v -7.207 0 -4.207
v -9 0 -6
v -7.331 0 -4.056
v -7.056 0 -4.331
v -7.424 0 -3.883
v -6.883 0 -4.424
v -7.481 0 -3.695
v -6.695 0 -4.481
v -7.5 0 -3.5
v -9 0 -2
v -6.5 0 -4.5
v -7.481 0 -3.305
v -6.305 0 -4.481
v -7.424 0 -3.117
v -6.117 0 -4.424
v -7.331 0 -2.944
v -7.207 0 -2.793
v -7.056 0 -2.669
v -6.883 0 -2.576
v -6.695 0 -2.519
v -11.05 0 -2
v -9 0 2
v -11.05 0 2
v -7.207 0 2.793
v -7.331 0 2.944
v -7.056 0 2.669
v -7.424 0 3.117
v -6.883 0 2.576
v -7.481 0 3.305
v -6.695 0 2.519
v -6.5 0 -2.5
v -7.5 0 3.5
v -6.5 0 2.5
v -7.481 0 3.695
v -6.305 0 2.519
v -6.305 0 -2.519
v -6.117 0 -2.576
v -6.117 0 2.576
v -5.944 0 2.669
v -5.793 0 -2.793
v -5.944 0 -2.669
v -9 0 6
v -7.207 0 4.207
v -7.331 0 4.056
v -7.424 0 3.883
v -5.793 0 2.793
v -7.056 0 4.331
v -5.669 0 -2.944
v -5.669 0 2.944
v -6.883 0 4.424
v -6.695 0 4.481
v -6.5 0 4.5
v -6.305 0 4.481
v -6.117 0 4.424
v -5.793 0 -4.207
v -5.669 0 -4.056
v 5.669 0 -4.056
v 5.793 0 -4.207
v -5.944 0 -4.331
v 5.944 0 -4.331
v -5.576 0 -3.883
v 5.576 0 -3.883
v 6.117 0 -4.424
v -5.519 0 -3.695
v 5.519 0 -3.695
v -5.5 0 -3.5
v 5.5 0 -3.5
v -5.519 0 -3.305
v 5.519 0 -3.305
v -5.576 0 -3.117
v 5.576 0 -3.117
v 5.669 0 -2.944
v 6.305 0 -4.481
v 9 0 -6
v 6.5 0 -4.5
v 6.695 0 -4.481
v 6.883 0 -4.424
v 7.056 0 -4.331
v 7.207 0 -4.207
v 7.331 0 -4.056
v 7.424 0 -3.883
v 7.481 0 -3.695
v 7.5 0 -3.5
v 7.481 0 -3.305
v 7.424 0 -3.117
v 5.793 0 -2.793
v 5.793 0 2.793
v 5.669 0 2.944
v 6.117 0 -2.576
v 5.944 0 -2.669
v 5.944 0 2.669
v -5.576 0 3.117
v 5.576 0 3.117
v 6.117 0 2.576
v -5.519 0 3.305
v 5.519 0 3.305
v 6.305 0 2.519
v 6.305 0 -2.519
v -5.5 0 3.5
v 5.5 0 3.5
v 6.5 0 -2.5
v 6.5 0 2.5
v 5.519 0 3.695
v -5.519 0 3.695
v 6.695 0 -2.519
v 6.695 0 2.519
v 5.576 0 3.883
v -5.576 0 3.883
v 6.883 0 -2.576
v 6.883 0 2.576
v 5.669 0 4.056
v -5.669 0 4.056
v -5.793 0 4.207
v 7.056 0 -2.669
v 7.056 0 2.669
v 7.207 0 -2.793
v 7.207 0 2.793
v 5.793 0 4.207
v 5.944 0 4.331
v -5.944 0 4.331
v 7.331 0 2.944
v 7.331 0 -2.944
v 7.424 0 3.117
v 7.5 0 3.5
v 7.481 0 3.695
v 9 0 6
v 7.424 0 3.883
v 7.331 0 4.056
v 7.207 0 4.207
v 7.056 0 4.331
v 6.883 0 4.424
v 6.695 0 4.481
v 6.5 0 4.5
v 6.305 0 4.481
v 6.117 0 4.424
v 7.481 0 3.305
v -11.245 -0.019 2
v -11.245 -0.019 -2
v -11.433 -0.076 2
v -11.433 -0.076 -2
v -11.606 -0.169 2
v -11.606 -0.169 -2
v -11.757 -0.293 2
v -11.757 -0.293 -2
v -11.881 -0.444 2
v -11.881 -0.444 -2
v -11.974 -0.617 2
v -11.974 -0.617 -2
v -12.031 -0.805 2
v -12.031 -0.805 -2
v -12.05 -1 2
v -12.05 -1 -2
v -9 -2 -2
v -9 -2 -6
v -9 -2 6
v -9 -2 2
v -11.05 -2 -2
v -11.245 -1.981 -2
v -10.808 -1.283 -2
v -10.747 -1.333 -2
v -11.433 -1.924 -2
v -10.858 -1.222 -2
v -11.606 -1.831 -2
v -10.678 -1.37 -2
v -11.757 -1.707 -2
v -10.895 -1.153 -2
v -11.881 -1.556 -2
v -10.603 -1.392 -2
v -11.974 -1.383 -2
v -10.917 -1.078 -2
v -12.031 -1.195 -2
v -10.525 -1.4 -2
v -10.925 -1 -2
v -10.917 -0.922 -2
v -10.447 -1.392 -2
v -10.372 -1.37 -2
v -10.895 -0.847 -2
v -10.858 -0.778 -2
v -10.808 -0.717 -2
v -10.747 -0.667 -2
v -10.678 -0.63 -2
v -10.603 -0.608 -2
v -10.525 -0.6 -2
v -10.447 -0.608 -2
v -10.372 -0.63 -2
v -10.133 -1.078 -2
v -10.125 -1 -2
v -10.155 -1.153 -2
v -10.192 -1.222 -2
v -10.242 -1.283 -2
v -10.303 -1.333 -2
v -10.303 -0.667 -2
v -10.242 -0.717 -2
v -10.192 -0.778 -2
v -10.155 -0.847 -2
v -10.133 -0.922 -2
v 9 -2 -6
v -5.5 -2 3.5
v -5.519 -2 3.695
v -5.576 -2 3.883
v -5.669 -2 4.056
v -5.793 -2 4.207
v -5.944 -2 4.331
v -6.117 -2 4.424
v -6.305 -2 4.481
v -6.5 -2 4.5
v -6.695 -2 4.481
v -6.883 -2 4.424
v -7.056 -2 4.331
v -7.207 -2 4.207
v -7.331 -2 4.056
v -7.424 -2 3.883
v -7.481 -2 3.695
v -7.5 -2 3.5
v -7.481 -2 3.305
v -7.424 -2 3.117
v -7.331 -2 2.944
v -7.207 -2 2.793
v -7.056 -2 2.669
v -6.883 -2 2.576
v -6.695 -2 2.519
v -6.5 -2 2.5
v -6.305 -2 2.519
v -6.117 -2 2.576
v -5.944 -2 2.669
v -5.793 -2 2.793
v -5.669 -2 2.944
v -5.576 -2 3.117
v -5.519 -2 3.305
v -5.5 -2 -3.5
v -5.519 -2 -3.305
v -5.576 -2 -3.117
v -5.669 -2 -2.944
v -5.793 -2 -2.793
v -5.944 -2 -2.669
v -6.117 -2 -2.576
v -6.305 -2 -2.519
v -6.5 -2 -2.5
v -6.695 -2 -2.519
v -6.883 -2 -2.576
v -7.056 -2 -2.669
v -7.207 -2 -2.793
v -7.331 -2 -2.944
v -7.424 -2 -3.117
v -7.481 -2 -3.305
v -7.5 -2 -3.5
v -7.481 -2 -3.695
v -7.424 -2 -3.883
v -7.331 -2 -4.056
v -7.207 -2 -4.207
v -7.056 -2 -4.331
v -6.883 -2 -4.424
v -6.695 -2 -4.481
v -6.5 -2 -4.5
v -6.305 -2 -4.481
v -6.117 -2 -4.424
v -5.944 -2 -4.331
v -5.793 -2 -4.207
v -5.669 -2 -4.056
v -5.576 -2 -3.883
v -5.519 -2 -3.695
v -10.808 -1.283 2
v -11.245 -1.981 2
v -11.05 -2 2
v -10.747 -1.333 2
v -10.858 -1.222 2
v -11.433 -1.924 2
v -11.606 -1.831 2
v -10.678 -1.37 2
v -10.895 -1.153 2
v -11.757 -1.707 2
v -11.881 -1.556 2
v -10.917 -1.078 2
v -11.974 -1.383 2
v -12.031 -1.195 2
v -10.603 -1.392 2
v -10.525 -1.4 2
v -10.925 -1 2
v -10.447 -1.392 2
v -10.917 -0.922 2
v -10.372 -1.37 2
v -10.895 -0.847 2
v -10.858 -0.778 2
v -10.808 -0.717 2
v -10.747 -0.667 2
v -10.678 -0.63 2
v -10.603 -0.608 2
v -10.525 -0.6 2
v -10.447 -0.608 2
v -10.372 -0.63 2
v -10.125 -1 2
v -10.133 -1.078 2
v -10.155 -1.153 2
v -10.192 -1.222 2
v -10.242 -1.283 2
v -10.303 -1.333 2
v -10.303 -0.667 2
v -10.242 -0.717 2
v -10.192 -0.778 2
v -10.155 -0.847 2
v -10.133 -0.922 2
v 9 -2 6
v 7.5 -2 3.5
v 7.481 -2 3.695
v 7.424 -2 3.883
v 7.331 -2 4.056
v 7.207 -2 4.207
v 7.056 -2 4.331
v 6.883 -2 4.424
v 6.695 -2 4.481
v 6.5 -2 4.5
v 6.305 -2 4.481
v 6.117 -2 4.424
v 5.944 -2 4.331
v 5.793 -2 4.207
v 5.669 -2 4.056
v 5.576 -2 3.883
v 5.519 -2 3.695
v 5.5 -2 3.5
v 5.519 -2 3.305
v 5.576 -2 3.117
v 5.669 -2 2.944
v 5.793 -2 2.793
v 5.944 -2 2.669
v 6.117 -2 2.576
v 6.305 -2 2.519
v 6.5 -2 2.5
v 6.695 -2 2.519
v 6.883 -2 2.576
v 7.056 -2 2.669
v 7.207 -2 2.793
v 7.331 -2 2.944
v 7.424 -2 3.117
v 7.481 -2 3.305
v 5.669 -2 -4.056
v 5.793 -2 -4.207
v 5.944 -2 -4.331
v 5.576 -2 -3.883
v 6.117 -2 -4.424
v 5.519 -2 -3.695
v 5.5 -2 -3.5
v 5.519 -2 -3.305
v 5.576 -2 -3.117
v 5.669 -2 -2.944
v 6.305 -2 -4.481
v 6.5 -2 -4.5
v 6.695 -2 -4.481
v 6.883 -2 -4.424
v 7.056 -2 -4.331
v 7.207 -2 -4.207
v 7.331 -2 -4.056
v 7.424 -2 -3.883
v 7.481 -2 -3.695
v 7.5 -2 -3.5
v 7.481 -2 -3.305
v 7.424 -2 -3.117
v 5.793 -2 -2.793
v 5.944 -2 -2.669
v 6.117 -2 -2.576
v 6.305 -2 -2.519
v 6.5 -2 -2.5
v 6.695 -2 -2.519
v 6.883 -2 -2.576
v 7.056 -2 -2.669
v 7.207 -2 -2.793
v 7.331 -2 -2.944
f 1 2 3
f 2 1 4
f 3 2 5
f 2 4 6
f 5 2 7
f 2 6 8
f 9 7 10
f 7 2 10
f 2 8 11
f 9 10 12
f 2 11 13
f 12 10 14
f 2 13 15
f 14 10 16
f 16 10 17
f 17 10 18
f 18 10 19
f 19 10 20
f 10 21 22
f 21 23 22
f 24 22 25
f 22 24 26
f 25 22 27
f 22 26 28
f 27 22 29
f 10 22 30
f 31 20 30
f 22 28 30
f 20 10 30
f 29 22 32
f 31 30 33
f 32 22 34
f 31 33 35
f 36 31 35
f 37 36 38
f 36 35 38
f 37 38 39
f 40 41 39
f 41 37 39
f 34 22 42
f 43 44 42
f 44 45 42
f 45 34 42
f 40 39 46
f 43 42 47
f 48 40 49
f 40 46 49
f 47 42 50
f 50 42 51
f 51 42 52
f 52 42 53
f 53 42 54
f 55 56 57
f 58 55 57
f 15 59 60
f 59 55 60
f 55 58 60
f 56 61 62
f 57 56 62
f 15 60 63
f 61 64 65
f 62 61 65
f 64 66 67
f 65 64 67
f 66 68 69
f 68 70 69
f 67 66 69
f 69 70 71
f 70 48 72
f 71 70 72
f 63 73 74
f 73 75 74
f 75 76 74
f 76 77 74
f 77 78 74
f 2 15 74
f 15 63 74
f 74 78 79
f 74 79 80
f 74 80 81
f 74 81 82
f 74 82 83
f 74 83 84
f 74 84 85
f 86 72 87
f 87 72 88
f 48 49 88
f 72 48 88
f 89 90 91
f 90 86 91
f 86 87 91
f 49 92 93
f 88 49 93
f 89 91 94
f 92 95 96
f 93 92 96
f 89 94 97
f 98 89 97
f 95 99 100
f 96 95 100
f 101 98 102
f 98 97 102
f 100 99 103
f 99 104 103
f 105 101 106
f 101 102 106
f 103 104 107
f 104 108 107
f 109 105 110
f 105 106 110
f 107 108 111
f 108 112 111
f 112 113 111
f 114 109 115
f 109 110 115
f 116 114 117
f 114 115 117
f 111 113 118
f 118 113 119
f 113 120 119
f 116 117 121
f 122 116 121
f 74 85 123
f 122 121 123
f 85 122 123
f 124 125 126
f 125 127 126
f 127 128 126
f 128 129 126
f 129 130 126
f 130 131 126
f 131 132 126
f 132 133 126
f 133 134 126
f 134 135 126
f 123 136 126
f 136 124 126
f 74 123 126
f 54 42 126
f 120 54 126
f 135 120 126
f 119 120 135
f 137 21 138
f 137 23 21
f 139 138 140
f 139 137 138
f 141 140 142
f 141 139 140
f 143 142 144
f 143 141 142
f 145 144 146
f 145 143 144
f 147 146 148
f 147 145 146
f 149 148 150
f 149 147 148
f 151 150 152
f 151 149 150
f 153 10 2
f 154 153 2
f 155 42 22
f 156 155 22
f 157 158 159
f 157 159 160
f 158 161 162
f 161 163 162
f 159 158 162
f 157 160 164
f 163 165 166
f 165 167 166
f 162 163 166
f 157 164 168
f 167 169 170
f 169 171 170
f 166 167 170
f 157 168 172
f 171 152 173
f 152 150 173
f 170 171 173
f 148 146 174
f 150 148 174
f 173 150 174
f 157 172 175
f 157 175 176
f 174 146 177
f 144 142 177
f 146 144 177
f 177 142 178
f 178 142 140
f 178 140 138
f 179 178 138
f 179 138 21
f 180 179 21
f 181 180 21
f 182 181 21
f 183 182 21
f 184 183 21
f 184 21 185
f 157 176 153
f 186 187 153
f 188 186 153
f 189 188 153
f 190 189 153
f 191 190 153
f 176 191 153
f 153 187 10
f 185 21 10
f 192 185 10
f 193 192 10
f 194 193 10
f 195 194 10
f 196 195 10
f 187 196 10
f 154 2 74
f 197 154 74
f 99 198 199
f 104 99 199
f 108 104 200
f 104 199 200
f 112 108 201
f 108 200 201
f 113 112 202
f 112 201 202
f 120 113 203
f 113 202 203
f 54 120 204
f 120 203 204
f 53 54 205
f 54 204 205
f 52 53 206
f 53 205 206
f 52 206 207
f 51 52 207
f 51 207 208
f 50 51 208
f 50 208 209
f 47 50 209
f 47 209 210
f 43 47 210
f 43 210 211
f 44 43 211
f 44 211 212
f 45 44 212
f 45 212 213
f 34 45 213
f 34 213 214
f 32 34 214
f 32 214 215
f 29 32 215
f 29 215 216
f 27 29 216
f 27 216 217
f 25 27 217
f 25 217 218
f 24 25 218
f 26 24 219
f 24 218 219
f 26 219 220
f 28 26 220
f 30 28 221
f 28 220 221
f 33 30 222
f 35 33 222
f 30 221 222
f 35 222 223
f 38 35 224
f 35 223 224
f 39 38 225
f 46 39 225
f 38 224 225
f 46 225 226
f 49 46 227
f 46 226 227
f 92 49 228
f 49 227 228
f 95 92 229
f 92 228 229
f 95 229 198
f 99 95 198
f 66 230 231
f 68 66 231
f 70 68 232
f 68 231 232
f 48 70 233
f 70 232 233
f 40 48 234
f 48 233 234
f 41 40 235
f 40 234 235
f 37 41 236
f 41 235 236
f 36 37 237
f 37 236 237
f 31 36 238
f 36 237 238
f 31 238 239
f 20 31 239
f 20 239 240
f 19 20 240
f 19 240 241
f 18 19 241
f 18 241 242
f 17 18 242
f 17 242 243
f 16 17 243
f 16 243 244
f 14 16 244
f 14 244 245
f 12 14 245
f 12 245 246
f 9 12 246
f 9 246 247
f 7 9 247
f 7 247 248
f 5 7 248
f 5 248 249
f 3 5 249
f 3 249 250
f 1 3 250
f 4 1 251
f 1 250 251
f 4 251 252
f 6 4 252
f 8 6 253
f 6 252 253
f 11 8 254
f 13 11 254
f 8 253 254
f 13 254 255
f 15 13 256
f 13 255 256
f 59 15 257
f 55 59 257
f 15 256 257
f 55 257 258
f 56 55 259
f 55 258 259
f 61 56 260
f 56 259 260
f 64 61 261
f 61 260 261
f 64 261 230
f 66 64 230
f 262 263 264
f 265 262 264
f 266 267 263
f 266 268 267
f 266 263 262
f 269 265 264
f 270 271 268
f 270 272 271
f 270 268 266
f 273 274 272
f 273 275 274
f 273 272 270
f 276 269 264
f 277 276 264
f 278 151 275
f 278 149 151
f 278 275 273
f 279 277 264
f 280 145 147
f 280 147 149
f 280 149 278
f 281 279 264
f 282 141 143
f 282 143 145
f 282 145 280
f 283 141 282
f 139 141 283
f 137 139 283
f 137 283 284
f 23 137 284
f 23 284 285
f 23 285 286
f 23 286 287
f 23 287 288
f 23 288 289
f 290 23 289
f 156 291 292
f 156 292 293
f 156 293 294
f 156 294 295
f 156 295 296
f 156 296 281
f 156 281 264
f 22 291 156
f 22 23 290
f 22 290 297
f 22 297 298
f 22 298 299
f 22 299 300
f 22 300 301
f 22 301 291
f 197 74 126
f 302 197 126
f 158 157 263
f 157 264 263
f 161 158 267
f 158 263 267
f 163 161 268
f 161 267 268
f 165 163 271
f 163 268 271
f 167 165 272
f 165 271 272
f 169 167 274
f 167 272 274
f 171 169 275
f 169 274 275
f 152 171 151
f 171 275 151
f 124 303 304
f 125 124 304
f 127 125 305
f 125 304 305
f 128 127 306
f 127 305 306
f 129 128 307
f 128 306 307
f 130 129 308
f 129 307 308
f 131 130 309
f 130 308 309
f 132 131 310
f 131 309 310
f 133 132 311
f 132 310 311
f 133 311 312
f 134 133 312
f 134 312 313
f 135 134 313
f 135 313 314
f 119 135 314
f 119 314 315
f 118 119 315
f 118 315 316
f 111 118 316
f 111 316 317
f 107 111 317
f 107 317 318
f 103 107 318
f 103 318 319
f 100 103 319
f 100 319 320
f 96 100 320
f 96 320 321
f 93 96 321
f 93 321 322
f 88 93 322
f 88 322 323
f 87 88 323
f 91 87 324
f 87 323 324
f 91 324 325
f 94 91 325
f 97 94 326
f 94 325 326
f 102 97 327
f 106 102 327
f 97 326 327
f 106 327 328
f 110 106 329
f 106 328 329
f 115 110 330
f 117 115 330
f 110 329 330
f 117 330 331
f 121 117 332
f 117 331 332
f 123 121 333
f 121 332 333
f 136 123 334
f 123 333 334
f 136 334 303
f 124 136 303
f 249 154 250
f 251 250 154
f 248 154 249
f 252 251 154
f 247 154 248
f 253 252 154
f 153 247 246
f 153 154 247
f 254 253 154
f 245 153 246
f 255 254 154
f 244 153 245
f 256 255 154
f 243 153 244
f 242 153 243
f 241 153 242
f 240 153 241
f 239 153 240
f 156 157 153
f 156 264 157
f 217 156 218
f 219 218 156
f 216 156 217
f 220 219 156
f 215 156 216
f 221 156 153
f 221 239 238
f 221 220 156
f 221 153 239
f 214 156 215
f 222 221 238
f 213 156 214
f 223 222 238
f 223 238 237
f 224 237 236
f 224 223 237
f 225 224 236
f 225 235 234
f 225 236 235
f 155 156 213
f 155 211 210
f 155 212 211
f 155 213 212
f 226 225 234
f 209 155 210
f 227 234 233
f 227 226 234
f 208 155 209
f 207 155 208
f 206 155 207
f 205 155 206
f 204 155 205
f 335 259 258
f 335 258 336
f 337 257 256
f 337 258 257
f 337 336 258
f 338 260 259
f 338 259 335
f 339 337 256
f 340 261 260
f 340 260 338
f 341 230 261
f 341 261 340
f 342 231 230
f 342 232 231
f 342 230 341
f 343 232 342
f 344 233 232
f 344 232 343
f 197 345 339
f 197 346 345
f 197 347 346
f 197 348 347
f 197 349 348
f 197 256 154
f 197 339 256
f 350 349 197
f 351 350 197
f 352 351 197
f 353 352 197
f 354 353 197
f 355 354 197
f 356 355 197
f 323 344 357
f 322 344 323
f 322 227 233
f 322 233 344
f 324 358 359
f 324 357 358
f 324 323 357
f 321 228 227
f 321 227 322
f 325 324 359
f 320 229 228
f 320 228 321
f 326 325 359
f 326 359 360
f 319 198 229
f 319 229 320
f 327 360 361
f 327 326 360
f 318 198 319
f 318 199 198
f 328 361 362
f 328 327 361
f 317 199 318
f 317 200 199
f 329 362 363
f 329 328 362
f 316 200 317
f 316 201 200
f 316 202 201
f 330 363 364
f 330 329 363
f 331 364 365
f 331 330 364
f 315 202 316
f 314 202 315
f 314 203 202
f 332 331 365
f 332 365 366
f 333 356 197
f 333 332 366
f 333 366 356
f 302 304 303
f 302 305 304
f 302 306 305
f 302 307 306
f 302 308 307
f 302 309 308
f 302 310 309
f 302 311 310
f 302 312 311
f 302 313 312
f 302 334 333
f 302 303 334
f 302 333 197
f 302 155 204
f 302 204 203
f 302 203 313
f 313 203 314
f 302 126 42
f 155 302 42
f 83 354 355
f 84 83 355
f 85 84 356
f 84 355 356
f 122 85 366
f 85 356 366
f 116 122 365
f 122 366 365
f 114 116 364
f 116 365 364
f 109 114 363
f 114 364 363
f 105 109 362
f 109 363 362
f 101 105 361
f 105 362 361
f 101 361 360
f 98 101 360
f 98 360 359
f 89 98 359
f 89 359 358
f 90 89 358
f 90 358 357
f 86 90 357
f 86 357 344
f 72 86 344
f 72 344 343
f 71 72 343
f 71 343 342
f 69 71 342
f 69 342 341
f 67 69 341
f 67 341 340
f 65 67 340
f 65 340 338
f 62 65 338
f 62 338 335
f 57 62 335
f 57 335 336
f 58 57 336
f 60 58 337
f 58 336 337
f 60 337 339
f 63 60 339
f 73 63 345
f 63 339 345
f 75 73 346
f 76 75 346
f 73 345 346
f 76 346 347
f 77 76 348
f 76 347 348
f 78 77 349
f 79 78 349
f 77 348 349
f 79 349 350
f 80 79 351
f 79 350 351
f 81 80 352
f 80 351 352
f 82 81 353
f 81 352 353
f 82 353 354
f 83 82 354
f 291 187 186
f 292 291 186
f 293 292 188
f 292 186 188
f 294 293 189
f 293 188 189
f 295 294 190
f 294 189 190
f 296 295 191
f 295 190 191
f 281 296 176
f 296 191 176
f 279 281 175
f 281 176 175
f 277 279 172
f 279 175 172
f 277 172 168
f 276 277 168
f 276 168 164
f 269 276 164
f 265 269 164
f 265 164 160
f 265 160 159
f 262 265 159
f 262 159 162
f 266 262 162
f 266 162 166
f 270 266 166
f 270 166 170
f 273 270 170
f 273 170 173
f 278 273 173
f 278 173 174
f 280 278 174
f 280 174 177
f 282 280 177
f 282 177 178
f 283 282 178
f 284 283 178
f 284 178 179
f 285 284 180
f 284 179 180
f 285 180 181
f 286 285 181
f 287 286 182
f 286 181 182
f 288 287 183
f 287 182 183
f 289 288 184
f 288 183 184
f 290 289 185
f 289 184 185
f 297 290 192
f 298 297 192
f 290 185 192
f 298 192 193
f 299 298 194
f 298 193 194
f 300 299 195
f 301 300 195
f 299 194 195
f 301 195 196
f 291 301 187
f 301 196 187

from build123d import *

# Parameters (mm, degrees)
F0_W     = 3.05
F0_H     = 4
F1_DEPTH = 2
F2_R     = 0.4
F3_DEPTH = 25
F4_R     = 1
F5_DEPTH = 25
F6_R     = 0.99999


# Not quite as in the source:
# - a fillet or chamfer is up to 0.001 mm smaller than in the source, because OpenCascade refuses the exact size


with BuildPart() as f1:
    # F0 (on Front) → F1 (new body)
    with BuildSketch(Plane.XZ):
        Polygon((9, -6), (9, 6), (-9, 6), (-9, 2), (-5.95, 2), (-5.95, -2), (-9, -2), (-9, -6), align=None)
        with Locations((-7.475, 0)):
            Rectangle(F0_W, F0_H)
        with Locations((-10.525, 0)):
            Rectangle(F0_W, F0_H)
    extrude(amount=F1_DEPTH)

    # F2 (on face) → F3 (cut)
    with BuildSketch(Plane(origin=(0, 0, -2), x_dir=(1, 0, 0), z_dir=(0, 0, -1))):
        with Locations((-10.525, 1)):
            Circle(F2_R)
    extrude(amount=-F3_DEPTH, mode=Mode.SUBTRACT)

    # F4 (on face) → F5 (cut)
    with BuildSketch(Plane.XZ.offset(2)):
        with Locations((-6.5, 3.5)):
            Circle(F4_R)
        with Locations((6.5, 3.5)):
            Circle(F4_R)
        with Locations((6.5, -3.5)):
            Circle(F4_R)
        with Locations((-6.5, -3.5)):
            Circle(F4_R)
    extrude(amount=-F5_DEPTH, mode=Mode.SUBTRACT)

    # F6 (radius 1 in the source; OpenCascade refuses exactly that, so slightly less here)
    f6_edges = [f1.edges().sort_by_distance(p)[0] for p in [
        (-12.05, -2, 0),
        (-12.05, 0, 0),
    ]]
    fillet(f6_edges, radius=F6_R)


solid = f1.part
